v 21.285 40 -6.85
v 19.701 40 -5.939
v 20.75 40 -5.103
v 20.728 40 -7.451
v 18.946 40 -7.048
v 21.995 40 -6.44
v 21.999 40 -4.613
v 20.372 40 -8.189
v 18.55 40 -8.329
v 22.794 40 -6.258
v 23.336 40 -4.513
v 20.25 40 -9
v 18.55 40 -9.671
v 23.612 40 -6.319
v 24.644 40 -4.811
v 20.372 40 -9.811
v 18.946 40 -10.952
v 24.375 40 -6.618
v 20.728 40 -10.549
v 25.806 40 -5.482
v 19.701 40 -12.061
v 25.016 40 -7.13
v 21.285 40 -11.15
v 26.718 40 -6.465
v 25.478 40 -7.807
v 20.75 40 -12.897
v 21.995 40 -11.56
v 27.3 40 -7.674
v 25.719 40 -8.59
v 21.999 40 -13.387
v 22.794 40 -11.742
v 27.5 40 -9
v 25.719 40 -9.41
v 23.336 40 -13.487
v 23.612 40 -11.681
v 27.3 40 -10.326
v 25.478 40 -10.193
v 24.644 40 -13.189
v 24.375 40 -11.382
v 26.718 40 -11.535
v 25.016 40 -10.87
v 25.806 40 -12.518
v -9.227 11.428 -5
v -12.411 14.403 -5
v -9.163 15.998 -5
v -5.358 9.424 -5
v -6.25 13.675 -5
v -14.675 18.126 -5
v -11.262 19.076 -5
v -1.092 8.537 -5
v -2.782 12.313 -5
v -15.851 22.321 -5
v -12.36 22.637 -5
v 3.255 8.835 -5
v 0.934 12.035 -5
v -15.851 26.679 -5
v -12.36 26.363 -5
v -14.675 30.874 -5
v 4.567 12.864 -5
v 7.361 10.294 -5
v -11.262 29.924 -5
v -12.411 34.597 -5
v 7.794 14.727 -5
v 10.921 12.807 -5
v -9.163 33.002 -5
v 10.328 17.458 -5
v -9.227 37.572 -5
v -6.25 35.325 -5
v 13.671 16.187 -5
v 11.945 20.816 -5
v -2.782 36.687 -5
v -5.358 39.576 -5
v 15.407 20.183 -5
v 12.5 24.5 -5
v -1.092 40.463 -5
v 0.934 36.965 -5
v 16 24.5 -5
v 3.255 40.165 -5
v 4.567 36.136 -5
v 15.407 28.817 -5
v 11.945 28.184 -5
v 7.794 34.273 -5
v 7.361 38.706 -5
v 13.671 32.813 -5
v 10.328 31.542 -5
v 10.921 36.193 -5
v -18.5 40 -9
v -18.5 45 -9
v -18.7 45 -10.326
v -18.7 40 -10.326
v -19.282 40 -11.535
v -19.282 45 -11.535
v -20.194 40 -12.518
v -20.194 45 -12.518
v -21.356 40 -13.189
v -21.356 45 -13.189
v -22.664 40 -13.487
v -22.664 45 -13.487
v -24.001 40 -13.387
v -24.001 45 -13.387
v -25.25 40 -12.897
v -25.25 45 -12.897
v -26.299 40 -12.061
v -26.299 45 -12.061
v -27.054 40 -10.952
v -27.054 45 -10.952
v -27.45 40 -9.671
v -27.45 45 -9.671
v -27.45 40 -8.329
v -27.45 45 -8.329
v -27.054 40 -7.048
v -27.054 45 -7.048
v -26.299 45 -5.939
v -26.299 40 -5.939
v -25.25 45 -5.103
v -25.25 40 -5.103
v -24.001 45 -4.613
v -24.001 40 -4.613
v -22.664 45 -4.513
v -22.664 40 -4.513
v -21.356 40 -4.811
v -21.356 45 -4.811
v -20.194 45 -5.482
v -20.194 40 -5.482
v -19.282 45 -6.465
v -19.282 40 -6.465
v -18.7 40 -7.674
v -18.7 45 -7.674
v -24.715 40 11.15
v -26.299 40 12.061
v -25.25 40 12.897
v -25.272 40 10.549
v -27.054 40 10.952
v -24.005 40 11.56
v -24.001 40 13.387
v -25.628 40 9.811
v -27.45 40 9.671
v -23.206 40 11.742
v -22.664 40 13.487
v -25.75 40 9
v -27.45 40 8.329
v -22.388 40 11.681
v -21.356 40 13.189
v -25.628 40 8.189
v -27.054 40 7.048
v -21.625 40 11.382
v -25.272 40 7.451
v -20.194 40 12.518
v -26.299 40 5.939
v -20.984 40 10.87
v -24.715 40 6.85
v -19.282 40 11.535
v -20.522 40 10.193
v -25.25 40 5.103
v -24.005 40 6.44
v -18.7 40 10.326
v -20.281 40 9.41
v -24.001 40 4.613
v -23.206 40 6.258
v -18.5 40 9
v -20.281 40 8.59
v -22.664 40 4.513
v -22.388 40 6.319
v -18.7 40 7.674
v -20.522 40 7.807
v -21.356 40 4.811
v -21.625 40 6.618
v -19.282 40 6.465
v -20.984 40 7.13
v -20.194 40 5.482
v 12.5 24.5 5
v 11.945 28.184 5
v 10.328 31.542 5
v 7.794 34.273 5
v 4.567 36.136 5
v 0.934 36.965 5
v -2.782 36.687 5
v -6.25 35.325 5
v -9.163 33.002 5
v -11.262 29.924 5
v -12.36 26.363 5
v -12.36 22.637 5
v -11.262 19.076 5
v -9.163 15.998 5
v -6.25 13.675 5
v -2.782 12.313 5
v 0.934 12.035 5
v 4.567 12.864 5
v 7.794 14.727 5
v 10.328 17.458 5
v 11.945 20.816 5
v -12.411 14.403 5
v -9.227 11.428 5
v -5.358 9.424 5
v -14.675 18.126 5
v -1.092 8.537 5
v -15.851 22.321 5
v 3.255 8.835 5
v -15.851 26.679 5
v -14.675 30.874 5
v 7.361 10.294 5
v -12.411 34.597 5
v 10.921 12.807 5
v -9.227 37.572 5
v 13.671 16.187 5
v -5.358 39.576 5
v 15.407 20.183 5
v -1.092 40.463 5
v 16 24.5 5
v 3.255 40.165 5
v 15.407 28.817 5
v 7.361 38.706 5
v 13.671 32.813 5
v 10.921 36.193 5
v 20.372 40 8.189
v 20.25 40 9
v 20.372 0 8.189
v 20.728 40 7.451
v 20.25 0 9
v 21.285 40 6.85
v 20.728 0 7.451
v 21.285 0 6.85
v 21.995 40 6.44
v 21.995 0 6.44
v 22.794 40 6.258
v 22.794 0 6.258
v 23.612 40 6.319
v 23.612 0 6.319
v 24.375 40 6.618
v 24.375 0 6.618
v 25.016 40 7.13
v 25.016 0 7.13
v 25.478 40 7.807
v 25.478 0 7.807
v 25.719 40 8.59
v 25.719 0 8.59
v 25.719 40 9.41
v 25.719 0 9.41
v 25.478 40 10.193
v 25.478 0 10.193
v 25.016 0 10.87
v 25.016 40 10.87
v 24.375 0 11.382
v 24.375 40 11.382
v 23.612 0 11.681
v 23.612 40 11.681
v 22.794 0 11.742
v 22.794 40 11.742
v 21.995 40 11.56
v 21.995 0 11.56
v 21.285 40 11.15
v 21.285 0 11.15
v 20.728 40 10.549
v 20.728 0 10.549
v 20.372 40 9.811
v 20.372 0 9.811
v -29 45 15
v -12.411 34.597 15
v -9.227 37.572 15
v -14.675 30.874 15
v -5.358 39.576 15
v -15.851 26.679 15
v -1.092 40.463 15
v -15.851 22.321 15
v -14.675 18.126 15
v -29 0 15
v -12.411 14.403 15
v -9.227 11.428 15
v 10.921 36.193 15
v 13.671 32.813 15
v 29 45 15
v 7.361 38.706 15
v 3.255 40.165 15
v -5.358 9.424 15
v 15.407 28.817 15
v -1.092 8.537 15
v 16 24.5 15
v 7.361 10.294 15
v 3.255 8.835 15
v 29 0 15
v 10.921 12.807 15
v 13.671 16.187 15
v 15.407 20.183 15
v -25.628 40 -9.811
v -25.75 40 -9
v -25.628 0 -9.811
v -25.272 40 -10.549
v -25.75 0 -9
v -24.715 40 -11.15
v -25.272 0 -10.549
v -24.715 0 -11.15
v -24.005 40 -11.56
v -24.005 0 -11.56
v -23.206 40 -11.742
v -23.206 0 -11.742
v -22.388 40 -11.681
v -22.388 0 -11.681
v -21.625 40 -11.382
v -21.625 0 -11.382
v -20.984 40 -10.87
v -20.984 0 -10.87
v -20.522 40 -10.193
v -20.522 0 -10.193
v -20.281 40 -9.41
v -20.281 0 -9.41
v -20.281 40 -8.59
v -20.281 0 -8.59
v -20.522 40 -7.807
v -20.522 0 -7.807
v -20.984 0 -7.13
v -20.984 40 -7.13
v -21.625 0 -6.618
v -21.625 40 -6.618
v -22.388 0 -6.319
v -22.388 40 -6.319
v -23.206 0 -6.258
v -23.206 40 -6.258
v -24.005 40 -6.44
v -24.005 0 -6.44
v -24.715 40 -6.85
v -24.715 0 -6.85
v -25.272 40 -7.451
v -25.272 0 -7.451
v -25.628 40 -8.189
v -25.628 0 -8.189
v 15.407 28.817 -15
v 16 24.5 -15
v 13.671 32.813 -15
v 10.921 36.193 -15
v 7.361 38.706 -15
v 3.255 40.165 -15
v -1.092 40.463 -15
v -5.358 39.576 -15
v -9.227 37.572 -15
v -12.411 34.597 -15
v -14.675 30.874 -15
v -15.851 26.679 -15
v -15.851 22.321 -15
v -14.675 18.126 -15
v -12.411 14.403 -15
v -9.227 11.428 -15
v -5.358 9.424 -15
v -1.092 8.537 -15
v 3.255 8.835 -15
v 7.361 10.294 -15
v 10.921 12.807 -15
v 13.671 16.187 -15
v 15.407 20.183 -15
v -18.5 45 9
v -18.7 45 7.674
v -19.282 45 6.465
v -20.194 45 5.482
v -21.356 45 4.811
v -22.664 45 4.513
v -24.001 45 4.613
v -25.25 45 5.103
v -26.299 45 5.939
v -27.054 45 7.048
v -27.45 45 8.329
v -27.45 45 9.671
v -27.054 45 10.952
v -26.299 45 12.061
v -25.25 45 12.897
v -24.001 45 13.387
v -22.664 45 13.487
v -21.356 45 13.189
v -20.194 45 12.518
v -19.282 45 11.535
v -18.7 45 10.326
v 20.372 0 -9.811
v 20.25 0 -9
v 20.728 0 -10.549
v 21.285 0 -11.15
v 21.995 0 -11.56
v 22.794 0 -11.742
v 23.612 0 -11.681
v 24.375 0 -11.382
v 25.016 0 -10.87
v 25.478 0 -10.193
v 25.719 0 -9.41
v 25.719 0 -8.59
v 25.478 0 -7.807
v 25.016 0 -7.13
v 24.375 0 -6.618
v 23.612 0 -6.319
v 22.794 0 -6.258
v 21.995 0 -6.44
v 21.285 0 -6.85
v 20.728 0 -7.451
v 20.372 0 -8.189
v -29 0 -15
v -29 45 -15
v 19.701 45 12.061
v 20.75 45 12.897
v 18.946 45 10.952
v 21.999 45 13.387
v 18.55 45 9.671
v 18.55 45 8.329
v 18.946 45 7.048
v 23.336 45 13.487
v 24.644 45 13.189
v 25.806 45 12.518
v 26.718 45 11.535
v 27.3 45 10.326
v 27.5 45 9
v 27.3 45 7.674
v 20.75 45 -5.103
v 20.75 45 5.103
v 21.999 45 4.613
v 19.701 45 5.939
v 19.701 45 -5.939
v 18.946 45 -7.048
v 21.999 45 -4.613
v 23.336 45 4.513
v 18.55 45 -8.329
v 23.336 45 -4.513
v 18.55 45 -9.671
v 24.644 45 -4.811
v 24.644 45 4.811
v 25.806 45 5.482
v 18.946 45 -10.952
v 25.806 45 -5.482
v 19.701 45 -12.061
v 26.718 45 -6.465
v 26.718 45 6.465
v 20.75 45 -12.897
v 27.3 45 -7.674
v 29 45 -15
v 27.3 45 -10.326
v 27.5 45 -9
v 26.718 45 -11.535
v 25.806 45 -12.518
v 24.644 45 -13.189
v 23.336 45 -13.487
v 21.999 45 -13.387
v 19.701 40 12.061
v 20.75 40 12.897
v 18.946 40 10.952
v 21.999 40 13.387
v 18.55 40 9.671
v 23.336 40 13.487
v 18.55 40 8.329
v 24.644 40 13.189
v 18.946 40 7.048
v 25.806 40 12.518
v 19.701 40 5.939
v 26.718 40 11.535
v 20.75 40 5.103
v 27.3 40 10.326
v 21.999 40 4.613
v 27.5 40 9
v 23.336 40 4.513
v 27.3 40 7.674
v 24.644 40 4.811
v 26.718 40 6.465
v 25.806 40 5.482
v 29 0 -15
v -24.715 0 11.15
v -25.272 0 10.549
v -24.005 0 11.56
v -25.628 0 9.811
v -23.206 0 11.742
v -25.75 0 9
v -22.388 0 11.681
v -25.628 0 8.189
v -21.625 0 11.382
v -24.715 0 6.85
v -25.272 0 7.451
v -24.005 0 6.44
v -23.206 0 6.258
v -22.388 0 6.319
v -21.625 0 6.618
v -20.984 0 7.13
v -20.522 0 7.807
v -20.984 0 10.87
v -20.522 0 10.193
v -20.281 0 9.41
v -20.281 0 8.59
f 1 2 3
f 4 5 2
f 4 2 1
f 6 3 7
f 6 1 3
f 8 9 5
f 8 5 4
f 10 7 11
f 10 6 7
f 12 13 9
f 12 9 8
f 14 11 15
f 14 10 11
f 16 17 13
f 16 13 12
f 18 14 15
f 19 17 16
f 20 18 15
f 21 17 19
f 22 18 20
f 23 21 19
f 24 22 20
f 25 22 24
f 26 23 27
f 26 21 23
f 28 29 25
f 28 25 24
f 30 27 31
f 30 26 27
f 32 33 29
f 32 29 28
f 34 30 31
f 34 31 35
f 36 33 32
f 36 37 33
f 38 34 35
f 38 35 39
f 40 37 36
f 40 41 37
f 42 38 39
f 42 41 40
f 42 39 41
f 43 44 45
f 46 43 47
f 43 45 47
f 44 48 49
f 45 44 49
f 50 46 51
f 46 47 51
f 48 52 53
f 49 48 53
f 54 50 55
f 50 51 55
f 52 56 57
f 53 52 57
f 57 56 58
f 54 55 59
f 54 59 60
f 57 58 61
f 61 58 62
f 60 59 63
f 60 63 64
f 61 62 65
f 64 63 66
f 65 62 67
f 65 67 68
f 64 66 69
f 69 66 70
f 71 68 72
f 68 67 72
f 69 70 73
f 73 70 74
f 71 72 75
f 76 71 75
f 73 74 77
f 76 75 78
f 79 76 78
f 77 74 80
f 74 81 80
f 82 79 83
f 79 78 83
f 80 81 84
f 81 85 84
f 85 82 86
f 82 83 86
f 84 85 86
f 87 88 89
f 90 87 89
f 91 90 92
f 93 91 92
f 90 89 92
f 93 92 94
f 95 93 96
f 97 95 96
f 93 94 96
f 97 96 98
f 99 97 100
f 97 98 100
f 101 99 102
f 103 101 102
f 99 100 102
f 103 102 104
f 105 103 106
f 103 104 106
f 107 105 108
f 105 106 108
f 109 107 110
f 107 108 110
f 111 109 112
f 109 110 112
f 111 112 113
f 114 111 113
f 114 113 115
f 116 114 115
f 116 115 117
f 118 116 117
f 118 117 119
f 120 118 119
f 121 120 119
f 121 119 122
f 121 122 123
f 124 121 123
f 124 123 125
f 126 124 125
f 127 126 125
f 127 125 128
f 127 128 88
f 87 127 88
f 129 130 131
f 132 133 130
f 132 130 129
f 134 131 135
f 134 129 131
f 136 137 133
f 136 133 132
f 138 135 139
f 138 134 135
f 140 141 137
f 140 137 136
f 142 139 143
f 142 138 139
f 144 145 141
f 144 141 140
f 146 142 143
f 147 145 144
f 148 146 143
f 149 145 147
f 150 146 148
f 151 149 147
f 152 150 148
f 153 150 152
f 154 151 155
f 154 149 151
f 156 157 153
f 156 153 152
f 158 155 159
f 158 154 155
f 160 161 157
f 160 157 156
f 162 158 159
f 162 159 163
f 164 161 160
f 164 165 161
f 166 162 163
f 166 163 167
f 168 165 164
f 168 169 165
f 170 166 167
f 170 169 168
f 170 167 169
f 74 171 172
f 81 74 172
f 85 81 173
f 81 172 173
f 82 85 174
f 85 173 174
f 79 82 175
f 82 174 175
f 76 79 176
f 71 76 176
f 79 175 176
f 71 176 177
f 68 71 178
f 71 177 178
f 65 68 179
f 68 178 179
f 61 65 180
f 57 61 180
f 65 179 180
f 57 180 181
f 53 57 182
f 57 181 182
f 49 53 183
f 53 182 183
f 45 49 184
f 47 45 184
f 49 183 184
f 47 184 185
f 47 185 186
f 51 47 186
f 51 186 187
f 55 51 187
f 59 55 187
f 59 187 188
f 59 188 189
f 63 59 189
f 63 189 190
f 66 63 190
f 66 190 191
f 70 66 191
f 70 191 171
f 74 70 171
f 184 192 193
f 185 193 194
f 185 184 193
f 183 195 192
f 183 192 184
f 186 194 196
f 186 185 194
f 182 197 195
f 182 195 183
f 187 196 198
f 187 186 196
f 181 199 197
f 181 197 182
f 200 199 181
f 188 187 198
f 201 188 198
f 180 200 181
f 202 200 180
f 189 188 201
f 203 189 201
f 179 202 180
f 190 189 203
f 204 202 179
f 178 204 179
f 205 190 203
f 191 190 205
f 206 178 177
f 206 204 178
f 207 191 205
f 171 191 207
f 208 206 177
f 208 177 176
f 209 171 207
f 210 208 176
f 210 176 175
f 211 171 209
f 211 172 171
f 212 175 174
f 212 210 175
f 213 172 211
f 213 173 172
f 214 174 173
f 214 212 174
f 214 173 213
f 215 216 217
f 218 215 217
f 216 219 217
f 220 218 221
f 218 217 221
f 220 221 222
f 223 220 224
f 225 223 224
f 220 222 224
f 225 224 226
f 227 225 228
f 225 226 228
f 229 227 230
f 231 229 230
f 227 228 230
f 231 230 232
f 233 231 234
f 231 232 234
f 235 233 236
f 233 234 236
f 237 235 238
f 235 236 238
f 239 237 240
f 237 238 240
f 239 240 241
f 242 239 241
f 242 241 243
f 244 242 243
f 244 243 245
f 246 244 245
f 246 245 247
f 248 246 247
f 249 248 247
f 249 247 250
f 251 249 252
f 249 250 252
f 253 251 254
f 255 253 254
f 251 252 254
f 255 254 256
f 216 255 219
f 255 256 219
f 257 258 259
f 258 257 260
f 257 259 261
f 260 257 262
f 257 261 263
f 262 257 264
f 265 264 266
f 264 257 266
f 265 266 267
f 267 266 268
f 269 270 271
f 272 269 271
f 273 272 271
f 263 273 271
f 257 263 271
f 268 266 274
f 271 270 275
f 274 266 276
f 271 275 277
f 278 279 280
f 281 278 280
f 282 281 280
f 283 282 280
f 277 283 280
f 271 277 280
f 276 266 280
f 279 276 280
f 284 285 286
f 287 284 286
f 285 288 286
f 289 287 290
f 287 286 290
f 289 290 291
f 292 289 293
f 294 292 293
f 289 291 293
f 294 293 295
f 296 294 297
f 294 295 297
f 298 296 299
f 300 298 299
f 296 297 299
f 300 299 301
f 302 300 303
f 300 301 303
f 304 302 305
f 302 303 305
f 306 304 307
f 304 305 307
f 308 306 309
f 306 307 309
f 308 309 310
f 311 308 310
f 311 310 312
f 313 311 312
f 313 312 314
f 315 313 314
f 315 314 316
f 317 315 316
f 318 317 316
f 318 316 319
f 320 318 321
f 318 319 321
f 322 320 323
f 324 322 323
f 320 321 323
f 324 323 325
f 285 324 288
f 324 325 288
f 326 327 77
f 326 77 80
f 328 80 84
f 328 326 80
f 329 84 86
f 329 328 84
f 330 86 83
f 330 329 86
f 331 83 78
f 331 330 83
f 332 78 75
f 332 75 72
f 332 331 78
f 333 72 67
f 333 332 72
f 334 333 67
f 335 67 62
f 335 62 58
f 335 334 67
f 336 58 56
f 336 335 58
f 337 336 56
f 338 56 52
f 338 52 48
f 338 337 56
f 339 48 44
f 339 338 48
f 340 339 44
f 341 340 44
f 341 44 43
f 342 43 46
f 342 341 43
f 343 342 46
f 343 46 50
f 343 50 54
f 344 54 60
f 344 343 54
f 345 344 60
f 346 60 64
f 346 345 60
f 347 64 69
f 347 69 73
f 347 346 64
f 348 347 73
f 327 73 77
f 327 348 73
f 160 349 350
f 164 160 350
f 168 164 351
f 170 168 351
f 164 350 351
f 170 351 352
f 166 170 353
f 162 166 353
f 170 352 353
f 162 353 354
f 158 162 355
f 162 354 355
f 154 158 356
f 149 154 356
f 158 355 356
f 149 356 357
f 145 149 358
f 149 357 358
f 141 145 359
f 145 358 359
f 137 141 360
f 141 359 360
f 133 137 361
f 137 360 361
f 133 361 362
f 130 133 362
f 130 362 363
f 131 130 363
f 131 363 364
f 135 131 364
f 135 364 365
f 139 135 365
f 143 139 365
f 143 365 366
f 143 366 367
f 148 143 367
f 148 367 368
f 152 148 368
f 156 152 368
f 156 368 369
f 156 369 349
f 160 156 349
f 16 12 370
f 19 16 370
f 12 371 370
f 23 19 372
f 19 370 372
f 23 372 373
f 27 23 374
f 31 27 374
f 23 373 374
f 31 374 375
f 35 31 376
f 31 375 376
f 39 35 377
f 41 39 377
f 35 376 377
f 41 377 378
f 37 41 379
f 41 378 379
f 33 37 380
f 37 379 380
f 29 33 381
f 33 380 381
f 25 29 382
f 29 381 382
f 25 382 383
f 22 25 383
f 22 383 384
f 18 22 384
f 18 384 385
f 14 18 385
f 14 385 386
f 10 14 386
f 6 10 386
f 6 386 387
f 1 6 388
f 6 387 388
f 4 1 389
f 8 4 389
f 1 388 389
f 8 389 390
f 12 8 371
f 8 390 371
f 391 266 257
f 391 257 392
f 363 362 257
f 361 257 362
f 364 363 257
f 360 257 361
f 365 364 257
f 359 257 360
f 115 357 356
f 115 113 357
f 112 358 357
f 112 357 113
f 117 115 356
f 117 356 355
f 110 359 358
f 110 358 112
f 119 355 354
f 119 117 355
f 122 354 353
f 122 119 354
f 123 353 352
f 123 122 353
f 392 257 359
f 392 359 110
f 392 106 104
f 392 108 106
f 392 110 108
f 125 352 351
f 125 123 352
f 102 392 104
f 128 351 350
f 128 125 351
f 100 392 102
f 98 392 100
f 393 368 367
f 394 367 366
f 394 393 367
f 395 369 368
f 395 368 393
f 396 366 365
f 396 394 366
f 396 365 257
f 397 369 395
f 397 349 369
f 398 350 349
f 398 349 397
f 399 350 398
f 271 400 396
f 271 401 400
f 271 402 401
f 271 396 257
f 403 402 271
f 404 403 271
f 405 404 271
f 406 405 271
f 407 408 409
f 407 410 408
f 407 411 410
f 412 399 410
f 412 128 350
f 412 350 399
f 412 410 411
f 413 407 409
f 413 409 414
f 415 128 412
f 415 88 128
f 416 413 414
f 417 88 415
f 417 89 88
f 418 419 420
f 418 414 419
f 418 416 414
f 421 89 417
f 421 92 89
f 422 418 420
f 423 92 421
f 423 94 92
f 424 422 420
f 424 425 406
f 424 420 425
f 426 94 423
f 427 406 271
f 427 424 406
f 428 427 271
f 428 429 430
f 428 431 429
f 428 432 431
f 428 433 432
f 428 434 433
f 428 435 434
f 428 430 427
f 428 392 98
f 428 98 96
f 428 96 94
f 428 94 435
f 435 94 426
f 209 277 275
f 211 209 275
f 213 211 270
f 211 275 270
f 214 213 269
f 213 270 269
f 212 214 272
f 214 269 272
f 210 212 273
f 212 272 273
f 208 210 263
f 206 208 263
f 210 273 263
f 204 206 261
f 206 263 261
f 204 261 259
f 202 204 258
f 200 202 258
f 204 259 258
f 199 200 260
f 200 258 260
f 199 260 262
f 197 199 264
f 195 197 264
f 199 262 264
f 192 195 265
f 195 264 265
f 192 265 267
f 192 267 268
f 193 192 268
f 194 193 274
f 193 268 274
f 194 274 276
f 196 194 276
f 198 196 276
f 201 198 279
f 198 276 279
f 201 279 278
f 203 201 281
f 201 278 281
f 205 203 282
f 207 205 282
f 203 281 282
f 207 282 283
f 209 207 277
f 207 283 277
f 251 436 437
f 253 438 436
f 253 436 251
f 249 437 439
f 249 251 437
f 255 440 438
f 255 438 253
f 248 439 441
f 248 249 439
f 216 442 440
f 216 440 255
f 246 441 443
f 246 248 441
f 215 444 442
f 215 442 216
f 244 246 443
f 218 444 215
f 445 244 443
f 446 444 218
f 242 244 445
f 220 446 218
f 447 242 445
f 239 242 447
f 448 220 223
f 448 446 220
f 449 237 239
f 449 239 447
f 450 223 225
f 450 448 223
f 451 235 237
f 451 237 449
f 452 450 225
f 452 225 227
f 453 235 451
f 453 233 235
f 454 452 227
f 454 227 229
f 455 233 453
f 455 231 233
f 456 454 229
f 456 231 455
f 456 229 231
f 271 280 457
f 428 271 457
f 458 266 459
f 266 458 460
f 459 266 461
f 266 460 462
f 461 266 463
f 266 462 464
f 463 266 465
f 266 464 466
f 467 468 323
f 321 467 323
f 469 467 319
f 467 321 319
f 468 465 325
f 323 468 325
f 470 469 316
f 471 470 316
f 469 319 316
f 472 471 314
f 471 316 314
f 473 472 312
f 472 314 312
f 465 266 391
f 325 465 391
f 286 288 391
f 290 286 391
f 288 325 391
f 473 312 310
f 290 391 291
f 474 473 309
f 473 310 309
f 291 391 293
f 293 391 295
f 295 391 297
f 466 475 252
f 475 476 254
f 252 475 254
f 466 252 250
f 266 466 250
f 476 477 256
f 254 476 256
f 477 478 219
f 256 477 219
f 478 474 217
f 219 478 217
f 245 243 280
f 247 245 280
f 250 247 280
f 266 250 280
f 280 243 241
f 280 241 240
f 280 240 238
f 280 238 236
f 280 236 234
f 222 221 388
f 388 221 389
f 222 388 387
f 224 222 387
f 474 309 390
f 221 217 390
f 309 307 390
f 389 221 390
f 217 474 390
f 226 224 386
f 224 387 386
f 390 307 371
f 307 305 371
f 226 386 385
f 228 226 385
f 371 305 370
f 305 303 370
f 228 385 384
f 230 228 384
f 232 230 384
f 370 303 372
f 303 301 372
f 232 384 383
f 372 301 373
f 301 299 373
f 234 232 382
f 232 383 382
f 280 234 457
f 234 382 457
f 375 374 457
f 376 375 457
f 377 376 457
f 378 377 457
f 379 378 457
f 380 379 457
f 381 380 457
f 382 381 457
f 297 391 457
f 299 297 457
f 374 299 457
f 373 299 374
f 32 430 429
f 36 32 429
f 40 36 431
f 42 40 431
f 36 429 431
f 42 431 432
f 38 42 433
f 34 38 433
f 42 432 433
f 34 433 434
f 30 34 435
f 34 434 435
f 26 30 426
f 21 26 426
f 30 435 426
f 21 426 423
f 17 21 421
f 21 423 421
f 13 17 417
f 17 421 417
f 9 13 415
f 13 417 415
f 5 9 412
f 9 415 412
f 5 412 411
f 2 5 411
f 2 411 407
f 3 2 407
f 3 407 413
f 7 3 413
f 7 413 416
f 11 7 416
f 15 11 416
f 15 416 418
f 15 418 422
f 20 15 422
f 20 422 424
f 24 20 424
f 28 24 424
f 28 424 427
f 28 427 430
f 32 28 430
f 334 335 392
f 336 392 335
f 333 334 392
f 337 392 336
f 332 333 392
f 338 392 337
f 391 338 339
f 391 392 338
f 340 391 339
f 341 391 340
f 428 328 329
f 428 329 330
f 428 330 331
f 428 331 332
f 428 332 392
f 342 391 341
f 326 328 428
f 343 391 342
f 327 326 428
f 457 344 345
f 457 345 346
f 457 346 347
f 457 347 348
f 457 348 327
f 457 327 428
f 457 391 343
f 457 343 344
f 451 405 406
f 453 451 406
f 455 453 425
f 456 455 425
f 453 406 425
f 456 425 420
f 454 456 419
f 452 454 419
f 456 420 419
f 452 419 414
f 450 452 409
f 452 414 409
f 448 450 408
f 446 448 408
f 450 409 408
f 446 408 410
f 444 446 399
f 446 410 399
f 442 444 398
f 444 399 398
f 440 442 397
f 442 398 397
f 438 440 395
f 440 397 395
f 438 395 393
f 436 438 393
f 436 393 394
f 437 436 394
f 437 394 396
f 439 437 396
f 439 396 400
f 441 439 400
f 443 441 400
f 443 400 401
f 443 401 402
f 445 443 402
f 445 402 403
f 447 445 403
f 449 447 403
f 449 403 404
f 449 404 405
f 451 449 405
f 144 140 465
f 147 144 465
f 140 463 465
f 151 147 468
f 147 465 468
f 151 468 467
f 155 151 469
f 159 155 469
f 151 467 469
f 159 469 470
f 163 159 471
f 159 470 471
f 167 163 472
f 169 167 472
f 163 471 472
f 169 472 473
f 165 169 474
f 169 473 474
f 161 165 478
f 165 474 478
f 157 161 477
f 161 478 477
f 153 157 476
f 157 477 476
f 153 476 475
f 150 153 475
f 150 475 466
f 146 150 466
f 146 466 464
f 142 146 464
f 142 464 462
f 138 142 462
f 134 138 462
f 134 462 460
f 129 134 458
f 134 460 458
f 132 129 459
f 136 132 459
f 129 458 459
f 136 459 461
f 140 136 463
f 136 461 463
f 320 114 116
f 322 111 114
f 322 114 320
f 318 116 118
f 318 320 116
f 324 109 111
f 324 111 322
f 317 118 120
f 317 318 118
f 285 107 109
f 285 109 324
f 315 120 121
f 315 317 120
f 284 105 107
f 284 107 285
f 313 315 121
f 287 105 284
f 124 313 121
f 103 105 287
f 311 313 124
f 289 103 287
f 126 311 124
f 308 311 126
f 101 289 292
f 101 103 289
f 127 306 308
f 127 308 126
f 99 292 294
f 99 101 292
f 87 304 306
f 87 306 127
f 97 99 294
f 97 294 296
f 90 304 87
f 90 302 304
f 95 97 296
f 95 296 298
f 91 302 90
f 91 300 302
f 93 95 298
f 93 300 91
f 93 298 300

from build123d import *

# Parameters (mm, degrees)
SZKIC1_W                                             = 58
SZKIC1_H                                             = 30
DODANIE_WYCI_GNI_CIE1_DEPTH                          = 45
SZKIC3_R                                             = 12.5
WYTNIJ_WYCI_GNI_CIE2_DEPTH                           = 62.36774397
SZKIC4_R                                             = 16
WYTNIJ_WYCI_GNI_CIE3_DEPTH                           = 10
POG_BIENIE_WALCOWE_POD_M5_WKR_T_DO_CZ_CI_D           = 5.5
POG_BIENIE_WALCOWE_POD_M5_WKR_T_DO_CZ_CI_CBORE_D     = 9
POG_BIENIE_WALCOWE_POD_M5_WKR_T_DO_CZ_CI_CBORE_DEPTH = 5


with BuildPart() as part:
    # Szkic1 → Dodanie-wyciągnięcie1 (new body)
    with BuildSketch(Plane(origin=(0, 0, 0), x_dir=(1, 0, 0), z_dir=(0, 1, 0))):
        Rectangle(SZKIC1_W, SZKIC1_H)
    extrude(amount=DODANIE_WYCI_GNI_CIE1_DEPTH)

    # Szkic3 → Wytnij-wyciągnięcie2 (cut, through all)
    with BuildSketch(Plane.XY.offset(15)):
        with Locations((0, 24.5)):
            Circle(SZKIC3_R)
    extrude(amount=-WYTNIJ_WYCI_GNI_CIE2_DEPTH, mode=Mode.SUBTRACT)

    # Szkic4 → Wytnij-wyciągnięcie3 (cut)
    with BuildSketch(Plane.XY.offset(15)):
        with Locations((0, 24.5)):
            Circle(SZKIC4_R)
    wytnij_wyci_gni_cie3 = extrude(amount=-WYTNIJ_WYCI_GNI_CIE3_DEPTH, mode=Mode.SUBTRACT)

    # Lustro1: Wytnij-wyciągnięcie3 across plane
    add(wytnij_wyci_gni_cie3.mirror(Plane.XY), mode=Mode.SUBTRACT)

    # Pogłębienie walcowe pod M5 Wkręt do części metalowych z łbem sześciokątnym1 (through all)
    with Locations(Plane(origin=(0, 45, 0), x_dir=(1, 0, 0), z_dir=(0, 1, 0))):
        with Locations((-23, -9), (-23, 9), (23, -9), (23, 9)):
            CounterBoreHole(POG_BIENIE_WALCOWE_POD_M5_WKR_T_DO_CZ_CI_D / 2, POG_BIENIE_WALCOWE_POD_M5_WKR_T_DO_CZ_CI_CBORE_D / 2, POG_BIENIE_WALCOWE_POD_M5_WKR_T_DO_CZ_CI_CBORE_DEPTH)


solid = part.part
